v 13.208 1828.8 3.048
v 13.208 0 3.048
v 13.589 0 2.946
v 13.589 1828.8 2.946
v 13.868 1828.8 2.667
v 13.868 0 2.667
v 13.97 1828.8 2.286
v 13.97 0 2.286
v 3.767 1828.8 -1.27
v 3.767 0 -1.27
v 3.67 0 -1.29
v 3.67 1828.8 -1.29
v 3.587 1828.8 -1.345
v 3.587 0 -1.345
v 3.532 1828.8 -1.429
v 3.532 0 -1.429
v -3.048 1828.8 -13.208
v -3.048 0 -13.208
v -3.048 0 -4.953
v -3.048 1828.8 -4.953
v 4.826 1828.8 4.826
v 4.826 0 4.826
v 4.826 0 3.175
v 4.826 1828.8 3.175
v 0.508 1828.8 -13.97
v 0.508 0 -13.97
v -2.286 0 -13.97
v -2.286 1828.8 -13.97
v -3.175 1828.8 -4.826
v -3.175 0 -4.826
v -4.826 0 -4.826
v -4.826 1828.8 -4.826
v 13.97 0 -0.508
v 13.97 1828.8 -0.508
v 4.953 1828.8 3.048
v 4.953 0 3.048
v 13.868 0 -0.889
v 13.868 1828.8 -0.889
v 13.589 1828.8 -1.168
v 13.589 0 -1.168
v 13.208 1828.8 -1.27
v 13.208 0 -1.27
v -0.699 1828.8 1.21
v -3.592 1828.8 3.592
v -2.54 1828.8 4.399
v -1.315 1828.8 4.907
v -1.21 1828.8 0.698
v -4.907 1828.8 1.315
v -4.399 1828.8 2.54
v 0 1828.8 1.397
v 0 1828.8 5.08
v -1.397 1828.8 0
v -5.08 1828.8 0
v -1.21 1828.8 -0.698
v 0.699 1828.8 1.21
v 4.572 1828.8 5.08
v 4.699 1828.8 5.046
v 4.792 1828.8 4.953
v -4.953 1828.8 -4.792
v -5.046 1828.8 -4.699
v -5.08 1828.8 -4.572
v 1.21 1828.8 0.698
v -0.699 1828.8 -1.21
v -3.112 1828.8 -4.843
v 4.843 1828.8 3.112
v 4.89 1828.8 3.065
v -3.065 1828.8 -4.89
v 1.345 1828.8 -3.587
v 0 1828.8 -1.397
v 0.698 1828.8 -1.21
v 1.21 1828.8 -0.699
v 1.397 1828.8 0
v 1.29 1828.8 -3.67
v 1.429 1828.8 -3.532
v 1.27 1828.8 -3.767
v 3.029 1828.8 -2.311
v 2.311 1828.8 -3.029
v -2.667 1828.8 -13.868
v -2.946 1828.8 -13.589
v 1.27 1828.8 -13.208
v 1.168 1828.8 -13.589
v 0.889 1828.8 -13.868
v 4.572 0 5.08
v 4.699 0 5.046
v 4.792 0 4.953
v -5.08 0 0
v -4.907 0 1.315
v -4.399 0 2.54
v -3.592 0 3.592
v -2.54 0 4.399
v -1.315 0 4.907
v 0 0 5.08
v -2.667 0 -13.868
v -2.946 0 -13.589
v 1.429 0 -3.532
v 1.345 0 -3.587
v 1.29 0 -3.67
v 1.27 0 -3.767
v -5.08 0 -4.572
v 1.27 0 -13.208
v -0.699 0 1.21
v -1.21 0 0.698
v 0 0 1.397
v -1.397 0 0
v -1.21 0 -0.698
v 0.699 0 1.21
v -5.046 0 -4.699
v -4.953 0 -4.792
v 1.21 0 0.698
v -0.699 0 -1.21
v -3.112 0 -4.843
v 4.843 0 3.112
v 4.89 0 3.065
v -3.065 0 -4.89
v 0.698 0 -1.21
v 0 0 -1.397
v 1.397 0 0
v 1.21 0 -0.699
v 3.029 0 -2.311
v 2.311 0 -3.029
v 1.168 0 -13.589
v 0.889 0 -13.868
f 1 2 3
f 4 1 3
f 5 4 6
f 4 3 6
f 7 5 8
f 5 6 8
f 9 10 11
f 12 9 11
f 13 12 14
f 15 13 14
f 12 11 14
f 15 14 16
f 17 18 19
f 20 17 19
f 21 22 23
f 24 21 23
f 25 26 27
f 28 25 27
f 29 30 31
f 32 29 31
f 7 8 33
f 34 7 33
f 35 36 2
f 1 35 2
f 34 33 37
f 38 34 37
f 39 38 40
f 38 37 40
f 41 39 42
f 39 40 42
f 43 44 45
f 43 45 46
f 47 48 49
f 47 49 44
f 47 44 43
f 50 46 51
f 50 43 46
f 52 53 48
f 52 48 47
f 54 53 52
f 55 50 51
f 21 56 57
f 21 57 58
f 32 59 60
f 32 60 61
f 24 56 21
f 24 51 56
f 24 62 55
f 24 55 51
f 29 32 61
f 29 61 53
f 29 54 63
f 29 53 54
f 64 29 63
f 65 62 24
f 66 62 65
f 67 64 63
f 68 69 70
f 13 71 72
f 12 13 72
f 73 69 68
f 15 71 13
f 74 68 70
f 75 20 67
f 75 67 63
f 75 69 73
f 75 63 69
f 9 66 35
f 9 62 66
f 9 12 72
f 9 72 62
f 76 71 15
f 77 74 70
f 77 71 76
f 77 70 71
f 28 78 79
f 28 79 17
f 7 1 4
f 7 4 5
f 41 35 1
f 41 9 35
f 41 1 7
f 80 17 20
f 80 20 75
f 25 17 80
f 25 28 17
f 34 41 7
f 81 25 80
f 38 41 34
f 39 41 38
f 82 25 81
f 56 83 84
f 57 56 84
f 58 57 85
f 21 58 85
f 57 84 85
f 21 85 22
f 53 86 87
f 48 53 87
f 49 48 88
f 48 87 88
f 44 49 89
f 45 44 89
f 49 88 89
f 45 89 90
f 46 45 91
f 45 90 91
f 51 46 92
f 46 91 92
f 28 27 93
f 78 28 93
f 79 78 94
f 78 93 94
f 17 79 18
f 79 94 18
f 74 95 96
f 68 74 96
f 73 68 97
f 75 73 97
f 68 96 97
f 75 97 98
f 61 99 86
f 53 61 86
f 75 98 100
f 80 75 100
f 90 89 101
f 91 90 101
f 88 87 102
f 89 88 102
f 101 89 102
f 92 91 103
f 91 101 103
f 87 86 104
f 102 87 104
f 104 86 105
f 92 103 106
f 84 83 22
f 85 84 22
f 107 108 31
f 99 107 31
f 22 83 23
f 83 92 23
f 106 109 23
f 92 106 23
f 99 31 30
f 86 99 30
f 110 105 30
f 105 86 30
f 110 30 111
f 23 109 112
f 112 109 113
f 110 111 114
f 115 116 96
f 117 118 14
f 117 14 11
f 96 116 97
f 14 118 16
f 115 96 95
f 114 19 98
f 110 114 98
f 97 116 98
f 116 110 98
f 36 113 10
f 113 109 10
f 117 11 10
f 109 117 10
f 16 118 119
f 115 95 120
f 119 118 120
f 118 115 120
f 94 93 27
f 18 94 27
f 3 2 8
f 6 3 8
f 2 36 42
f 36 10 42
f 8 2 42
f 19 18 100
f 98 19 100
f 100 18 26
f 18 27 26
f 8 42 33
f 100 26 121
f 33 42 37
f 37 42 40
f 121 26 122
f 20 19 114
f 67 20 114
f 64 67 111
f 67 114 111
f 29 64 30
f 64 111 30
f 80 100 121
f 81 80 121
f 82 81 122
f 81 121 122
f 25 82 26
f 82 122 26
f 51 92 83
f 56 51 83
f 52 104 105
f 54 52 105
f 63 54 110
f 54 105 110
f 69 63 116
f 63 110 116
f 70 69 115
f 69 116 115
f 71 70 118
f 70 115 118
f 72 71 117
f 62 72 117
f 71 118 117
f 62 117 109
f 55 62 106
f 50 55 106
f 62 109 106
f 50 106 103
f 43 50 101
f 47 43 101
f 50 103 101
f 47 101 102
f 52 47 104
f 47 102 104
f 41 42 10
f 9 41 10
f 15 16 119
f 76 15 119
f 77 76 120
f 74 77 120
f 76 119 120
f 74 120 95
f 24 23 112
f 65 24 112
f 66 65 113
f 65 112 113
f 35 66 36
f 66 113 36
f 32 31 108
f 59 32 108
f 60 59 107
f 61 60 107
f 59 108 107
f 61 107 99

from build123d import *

# Parameters (mm, degrees)
BOSS_EXTRUDE1_DEPTH = 1828.8
THRU_HOLES_D        = 2.794


with BuildPart() as part:
    # Sketch1 → Boss-Extrude1 (new body)
    with BuildSketch(Plane(origin=(0, 0, 0), x_dir=(1, 0, 0), z_dir=(0, 1, 0))):
        with BuildLine():
            Line((-3.048, 13.208), (-3.048, 4.953))
            ThreePointArc((-3.048, 4.953), (-3.085197439, 4.863197439), (-3.175, 4.826))
            Line((-3.175, 4.826), (-4.826, 4.826))
            ThreePointArc((-4.826, 4.826), (-5.005605122, 4.751605122), (-5.08, 4.572))
            Line((-5.08, 4.572), (-5.08, 0))
            ThreePointArc((-5.08, 0), (-3.592102448, -3.592102448), (0, -5.08))
            Line((0, -5.08), (4.572, -5.08))
            ThreePointArc((4.572, -5.08), (4.751605122, -5.005605122), (4.826, -4.826))
            Line((4.826, -4.826), (4.826, -3.175))
            ThreePointArc((4.826, -3.175), (4.863197439, -3.085197439), (4.953, -3.048))
            Line((4.953, -3.048), (13.208, -3.048))
            ThreePointArc((13.208, -3.048), (13.746815367, -2.824815367), (13.97, -2.286))
            Line((13.97, -2.286), (13.97, 0.508))
            ThreePointArc((13.97, 0.508), (13.746815367, 1.046815367), (13.208, 1.27))
            Line((13.208, 1.27), (3.767428831, 1.27))
            ThreePointArc((3.767428831, 1.27), (3.625438515, 1.313394326), (3.531964529, 1.42875))
            ThreePointArc((3.531964529, 1.42875), (2.694076836, 2.694076836), (1.42875, 3.531964529))
            ThreePointArc((1.42875, 3.531964529), (1.313394326, 3.625438515), (1.27, 3.767428831))
            Line((1.27, 3.767428831), (1.27, 13.208))
            ThreePointArc((1.27, 13.208), (1.046815367, 13.746815367), (0.508, 13.97))
            Line((0.508, 13.97), (-2.286, 13.97))
            ThreePointArc((-2.286, 13.97), (-2.824815367, 13.746815367), (-3.048, 13.208))
        make_face()
    extrude(amount=BOSS_EXTRUDE1_DEPTH)

    # THRU HOLES (through all)
    with Locations(Plane(origin=(0, 1828.8, 0), x_dir=(1, 0, 0), z_dir=(0, 1, 0))):
        with Locations((0, 0)):
            Hole(THRU_HOLES_D / 2)


solid = part.part
